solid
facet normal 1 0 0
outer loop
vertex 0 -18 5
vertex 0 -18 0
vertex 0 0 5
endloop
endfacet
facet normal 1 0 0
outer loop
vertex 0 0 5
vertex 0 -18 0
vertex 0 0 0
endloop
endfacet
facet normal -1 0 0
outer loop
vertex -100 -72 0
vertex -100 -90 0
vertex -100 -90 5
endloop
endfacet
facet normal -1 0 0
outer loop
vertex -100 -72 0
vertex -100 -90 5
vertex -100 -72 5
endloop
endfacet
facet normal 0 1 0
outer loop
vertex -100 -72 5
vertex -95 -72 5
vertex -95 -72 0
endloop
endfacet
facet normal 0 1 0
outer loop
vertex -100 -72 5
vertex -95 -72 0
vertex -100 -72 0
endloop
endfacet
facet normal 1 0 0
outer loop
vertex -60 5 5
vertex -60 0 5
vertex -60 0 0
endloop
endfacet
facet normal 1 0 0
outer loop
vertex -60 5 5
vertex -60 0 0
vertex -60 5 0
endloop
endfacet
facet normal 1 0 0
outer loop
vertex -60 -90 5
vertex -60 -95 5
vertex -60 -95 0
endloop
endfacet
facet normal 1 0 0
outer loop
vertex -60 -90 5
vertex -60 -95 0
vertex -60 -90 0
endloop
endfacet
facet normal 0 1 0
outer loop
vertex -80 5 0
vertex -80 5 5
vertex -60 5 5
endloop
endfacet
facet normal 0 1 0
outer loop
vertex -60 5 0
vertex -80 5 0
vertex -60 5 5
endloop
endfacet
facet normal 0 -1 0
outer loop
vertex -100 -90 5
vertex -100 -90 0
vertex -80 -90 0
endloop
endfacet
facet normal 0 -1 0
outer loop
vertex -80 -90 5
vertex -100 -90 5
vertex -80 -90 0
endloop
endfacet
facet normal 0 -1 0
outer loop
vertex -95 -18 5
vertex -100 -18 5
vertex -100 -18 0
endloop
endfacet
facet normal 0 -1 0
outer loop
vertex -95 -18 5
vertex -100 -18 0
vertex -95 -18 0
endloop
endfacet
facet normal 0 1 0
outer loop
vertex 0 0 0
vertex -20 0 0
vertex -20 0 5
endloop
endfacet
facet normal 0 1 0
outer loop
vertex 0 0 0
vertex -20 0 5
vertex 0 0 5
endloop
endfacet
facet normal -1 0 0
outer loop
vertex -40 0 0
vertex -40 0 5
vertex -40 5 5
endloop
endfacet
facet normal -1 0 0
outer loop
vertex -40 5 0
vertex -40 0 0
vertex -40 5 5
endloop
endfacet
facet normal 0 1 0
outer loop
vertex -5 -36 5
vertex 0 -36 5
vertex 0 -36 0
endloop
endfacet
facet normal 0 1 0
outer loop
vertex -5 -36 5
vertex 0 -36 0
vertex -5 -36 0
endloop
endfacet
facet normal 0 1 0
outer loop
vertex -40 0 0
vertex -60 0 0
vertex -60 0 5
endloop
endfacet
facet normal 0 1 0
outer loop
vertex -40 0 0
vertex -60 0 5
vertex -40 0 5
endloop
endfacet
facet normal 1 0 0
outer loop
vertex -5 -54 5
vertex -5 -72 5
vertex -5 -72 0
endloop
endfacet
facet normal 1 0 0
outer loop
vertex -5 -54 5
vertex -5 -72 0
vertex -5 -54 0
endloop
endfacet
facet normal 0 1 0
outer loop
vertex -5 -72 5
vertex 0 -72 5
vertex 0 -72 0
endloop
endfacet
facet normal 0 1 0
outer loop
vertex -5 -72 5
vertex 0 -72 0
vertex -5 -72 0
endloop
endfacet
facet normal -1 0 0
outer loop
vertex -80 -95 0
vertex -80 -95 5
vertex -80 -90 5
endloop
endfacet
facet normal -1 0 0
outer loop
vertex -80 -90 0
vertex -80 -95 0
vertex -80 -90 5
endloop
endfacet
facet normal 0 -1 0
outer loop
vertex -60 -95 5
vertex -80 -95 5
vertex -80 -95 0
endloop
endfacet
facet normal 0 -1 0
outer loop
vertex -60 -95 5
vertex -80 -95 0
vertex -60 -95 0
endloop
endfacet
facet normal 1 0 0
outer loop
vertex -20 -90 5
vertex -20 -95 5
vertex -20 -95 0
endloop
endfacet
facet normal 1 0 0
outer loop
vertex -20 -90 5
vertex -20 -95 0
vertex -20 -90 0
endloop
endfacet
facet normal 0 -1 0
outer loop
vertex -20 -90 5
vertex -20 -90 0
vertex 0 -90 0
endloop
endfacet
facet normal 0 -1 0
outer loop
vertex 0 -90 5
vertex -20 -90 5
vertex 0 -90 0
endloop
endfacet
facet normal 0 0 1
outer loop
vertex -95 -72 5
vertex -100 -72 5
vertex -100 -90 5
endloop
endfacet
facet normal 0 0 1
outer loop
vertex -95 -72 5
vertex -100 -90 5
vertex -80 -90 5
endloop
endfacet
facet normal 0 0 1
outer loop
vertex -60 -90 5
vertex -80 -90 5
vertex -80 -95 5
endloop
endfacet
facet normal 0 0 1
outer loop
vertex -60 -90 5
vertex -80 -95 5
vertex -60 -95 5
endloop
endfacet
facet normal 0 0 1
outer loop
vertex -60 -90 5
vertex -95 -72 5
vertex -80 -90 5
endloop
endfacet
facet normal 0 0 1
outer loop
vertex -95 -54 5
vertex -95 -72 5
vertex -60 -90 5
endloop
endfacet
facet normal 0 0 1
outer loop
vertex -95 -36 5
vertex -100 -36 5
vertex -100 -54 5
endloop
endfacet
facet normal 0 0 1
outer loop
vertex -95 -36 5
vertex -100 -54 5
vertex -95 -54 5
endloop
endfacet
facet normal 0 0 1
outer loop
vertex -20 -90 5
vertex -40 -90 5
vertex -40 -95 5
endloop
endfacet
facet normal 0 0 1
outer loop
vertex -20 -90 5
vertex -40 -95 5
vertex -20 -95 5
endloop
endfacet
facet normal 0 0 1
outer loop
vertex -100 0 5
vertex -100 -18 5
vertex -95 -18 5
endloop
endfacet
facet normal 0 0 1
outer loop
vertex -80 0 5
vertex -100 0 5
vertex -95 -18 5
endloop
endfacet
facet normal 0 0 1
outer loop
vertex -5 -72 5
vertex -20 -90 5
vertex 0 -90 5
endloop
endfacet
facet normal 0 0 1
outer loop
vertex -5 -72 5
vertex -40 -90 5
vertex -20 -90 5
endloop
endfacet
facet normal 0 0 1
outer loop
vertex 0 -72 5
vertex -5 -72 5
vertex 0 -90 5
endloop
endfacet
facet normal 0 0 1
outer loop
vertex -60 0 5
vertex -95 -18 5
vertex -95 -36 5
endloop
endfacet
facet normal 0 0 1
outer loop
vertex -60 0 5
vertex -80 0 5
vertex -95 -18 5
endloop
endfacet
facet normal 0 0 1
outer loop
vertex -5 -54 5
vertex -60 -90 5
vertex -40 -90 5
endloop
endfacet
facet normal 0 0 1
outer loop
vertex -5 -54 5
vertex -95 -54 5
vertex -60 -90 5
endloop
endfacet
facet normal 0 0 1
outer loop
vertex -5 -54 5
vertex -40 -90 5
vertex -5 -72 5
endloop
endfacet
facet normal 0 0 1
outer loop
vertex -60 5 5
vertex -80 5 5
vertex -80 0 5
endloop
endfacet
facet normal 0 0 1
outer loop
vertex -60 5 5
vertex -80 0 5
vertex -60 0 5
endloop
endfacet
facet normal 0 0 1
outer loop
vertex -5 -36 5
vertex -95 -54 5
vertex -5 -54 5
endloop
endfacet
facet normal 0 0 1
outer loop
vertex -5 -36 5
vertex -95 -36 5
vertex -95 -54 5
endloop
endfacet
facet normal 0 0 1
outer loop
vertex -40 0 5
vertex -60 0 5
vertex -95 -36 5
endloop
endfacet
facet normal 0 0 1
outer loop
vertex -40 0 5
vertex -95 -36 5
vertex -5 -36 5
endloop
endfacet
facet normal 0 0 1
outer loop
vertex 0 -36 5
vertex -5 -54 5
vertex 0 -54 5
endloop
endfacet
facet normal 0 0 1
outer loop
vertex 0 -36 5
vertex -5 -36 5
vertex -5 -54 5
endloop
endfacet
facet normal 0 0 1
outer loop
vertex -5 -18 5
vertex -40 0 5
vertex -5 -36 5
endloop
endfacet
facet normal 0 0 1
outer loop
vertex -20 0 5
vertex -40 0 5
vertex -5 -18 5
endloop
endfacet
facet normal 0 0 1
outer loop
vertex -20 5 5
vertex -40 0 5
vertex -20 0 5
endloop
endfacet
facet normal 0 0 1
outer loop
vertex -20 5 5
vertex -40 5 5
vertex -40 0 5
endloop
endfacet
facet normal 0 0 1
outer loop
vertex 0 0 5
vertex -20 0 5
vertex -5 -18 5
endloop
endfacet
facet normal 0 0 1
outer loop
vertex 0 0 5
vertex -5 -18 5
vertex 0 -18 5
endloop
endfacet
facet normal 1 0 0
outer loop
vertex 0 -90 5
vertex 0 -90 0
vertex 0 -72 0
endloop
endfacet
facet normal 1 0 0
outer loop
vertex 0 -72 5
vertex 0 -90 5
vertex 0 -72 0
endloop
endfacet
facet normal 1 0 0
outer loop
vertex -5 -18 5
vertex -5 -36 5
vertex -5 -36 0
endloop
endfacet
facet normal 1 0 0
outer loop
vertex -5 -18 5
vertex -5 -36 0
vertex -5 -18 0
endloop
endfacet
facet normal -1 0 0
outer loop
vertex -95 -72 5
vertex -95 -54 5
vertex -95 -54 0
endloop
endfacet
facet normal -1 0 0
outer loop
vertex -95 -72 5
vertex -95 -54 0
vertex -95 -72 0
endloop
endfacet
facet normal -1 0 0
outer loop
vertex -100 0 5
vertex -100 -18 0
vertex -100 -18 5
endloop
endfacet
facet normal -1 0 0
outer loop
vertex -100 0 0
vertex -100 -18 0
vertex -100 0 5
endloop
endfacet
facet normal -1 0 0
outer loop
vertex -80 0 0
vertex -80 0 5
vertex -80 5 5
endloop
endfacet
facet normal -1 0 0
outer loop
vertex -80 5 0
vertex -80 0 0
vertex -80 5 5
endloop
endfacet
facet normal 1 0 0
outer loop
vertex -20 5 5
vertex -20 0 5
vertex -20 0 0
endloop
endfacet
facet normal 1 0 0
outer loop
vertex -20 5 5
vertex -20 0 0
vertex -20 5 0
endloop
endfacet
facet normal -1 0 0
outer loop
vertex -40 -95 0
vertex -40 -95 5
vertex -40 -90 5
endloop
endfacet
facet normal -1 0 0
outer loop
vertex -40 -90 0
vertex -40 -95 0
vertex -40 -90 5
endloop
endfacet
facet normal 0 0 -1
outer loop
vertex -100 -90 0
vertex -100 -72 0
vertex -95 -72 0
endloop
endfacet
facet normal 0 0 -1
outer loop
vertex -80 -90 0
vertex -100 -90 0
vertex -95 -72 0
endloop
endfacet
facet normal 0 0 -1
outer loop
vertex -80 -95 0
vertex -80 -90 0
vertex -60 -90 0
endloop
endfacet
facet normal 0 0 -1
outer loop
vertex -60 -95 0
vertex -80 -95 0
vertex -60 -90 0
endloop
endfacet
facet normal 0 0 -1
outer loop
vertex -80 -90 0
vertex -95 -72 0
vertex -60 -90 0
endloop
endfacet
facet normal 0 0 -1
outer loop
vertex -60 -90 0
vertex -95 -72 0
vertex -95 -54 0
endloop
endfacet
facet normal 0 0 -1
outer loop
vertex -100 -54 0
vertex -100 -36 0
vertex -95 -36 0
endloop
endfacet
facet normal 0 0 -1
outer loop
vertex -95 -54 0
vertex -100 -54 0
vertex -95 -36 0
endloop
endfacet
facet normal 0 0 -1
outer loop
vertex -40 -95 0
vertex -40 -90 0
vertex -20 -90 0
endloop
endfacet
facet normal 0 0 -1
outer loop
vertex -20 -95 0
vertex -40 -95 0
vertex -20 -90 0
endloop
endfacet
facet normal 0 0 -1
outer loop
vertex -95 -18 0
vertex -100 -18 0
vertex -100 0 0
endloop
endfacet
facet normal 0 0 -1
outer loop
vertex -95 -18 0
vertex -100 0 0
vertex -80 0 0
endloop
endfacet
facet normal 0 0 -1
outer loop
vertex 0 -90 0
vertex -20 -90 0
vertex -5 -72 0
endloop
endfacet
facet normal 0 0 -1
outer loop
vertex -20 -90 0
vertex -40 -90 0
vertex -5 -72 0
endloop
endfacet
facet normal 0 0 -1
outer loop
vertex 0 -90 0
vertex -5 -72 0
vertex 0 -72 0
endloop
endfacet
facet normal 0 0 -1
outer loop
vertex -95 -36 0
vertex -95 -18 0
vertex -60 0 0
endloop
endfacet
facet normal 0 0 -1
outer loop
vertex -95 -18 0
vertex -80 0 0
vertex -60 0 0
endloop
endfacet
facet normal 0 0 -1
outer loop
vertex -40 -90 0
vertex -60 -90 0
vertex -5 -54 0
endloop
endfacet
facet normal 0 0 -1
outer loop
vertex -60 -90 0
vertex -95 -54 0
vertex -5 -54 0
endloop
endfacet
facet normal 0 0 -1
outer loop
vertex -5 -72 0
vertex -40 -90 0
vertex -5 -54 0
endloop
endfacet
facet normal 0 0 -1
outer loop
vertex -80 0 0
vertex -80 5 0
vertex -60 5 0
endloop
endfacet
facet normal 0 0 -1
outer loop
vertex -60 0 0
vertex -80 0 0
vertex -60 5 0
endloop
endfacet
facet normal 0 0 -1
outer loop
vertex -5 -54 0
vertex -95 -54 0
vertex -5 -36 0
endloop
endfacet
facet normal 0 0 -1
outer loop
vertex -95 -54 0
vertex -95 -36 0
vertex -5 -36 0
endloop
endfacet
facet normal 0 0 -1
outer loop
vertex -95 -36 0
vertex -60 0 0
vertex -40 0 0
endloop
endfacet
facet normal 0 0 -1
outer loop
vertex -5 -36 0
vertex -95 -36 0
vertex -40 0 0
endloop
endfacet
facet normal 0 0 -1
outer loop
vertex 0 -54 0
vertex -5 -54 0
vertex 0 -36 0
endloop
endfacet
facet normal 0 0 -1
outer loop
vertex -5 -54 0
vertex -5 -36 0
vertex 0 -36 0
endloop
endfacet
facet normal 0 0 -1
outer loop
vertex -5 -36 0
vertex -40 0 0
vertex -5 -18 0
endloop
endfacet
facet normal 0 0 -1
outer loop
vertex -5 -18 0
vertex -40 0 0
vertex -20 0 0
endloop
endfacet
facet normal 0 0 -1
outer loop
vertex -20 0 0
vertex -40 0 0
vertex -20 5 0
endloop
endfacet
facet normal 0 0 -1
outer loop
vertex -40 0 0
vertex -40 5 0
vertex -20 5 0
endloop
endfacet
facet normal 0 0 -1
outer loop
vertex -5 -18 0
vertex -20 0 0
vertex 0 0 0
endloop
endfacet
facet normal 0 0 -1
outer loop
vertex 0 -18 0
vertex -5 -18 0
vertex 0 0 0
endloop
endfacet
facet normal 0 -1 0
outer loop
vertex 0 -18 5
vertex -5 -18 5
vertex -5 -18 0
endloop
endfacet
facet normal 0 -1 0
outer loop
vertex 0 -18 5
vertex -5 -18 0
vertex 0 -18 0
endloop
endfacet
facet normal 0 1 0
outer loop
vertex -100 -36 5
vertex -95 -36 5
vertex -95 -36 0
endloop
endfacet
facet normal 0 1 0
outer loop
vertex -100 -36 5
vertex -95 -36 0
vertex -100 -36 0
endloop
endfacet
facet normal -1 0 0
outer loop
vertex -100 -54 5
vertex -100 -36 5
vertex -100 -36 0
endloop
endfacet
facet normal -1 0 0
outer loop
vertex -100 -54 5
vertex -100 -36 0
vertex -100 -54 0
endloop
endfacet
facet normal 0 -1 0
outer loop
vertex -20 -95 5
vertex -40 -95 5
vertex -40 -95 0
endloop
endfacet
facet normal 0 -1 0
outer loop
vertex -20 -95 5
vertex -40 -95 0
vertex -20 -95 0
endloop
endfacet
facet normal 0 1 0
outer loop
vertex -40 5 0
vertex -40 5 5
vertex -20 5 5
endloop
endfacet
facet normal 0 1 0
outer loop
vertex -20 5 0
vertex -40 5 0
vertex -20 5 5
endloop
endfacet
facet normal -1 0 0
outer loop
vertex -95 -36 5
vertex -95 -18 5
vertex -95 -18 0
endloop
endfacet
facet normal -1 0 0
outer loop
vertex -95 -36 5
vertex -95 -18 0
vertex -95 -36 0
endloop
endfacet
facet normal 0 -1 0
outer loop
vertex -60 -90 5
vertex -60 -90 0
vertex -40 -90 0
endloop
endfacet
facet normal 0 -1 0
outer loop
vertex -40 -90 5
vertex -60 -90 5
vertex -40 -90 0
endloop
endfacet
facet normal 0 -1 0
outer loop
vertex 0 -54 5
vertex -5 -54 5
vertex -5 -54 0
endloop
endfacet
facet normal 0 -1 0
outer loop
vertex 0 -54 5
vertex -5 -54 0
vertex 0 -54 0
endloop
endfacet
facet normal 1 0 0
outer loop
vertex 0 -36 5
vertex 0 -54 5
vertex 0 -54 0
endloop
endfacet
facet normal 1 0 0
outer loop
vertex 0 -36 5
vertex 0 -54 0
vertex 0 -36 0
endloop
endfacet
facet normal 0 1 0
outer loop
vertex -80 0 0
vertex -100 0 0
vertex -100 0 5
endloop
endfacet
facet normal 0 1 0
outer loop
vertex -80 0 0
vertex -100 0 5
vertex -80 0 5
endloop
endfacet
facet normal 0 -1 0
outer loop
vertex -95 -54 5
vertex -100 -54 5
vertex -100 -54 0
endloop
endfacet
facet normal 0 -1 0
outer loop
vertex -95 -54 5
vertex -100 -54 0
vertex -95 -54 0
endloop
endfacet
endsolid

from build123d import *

# Parameters (mm, degrees)
ESQUISSE1_W             = 100
ESQUISSE1_H             = 90
BOSS_EXTRU_1_DEPTH      = 5
ESQUISSE2_OUTSIDE_W     = 128.926
ESQUISSE2_OUTSIDE_H     = 118.926
ENL_V_MAT_EXTRU_1_DEPTH = 5
ESQUISSE3_W             = 20
ESQUISSE3_H             = 5
BOSS_EXTRU_2_DEPTH      = 5


with BuildPart() as part:
    # Esquisse1 → Boss.-Extru.1 (new body)
    with BuildSketch(Plane.XY):
        with Locations((-50, -45)):
            Rectangle(ESQUISSE1_W, ESQUISSE1_H)
    extrude(amount=BOSS_EXTRU_1_DEPTH)

    # Esquisse2 outside → Enlèv. mat.-Extru.1 (cut)
    with BuildSketch(Plane.XY.offset(5)):
        with Locations((-50, -45)):
            Rectangle(ESQUISSE2_OUTSIDE_W, ESQUISSE2_OUTSIDE_H)
        Polygon((-100, 0), (-100, -18), (-95, -18), (-95, -36), (-100, -36), (-100, -54), (-95, -54), (-95, -72), (-100, -72), (-100, -90), (0, -90), (0, -72), (-5, -72), (-5, -54), (0, -54), (0, -36), (-5, -36), (-5, -18), (0, -18), (0, 0), align=None, mode=Mode.SUBTRACT)
    extrude(amount=-ENL_V_MAT_EXTRU_1_DEPTH, mode=Mode.SUBTRACT)

    # Esquisse3 → Boss.-Extru.2 (add)
    with BuildSketch(Plane.XY.offset(5)):
        with Locations((-70, 2.5)):
            Rectangle(ESQUISSE3_W, ESQUISSE3_H)
        with Locations((-30, 2.5)):
            Rectangle(ESQUISSE3_W, ESQUISSE3_H)
        with Locations((-70, -92.5)):
            Rectangle(ESQUISSE3_W, ESQUISSE3_H)
        with Locations((-30, -92.5)):
            Rectangle(ESQUISSE3_W, ESQUISSE3_H)
    extrude(amount=-BOSS_EXTRU_2_DEPTH)


solid = part.part
